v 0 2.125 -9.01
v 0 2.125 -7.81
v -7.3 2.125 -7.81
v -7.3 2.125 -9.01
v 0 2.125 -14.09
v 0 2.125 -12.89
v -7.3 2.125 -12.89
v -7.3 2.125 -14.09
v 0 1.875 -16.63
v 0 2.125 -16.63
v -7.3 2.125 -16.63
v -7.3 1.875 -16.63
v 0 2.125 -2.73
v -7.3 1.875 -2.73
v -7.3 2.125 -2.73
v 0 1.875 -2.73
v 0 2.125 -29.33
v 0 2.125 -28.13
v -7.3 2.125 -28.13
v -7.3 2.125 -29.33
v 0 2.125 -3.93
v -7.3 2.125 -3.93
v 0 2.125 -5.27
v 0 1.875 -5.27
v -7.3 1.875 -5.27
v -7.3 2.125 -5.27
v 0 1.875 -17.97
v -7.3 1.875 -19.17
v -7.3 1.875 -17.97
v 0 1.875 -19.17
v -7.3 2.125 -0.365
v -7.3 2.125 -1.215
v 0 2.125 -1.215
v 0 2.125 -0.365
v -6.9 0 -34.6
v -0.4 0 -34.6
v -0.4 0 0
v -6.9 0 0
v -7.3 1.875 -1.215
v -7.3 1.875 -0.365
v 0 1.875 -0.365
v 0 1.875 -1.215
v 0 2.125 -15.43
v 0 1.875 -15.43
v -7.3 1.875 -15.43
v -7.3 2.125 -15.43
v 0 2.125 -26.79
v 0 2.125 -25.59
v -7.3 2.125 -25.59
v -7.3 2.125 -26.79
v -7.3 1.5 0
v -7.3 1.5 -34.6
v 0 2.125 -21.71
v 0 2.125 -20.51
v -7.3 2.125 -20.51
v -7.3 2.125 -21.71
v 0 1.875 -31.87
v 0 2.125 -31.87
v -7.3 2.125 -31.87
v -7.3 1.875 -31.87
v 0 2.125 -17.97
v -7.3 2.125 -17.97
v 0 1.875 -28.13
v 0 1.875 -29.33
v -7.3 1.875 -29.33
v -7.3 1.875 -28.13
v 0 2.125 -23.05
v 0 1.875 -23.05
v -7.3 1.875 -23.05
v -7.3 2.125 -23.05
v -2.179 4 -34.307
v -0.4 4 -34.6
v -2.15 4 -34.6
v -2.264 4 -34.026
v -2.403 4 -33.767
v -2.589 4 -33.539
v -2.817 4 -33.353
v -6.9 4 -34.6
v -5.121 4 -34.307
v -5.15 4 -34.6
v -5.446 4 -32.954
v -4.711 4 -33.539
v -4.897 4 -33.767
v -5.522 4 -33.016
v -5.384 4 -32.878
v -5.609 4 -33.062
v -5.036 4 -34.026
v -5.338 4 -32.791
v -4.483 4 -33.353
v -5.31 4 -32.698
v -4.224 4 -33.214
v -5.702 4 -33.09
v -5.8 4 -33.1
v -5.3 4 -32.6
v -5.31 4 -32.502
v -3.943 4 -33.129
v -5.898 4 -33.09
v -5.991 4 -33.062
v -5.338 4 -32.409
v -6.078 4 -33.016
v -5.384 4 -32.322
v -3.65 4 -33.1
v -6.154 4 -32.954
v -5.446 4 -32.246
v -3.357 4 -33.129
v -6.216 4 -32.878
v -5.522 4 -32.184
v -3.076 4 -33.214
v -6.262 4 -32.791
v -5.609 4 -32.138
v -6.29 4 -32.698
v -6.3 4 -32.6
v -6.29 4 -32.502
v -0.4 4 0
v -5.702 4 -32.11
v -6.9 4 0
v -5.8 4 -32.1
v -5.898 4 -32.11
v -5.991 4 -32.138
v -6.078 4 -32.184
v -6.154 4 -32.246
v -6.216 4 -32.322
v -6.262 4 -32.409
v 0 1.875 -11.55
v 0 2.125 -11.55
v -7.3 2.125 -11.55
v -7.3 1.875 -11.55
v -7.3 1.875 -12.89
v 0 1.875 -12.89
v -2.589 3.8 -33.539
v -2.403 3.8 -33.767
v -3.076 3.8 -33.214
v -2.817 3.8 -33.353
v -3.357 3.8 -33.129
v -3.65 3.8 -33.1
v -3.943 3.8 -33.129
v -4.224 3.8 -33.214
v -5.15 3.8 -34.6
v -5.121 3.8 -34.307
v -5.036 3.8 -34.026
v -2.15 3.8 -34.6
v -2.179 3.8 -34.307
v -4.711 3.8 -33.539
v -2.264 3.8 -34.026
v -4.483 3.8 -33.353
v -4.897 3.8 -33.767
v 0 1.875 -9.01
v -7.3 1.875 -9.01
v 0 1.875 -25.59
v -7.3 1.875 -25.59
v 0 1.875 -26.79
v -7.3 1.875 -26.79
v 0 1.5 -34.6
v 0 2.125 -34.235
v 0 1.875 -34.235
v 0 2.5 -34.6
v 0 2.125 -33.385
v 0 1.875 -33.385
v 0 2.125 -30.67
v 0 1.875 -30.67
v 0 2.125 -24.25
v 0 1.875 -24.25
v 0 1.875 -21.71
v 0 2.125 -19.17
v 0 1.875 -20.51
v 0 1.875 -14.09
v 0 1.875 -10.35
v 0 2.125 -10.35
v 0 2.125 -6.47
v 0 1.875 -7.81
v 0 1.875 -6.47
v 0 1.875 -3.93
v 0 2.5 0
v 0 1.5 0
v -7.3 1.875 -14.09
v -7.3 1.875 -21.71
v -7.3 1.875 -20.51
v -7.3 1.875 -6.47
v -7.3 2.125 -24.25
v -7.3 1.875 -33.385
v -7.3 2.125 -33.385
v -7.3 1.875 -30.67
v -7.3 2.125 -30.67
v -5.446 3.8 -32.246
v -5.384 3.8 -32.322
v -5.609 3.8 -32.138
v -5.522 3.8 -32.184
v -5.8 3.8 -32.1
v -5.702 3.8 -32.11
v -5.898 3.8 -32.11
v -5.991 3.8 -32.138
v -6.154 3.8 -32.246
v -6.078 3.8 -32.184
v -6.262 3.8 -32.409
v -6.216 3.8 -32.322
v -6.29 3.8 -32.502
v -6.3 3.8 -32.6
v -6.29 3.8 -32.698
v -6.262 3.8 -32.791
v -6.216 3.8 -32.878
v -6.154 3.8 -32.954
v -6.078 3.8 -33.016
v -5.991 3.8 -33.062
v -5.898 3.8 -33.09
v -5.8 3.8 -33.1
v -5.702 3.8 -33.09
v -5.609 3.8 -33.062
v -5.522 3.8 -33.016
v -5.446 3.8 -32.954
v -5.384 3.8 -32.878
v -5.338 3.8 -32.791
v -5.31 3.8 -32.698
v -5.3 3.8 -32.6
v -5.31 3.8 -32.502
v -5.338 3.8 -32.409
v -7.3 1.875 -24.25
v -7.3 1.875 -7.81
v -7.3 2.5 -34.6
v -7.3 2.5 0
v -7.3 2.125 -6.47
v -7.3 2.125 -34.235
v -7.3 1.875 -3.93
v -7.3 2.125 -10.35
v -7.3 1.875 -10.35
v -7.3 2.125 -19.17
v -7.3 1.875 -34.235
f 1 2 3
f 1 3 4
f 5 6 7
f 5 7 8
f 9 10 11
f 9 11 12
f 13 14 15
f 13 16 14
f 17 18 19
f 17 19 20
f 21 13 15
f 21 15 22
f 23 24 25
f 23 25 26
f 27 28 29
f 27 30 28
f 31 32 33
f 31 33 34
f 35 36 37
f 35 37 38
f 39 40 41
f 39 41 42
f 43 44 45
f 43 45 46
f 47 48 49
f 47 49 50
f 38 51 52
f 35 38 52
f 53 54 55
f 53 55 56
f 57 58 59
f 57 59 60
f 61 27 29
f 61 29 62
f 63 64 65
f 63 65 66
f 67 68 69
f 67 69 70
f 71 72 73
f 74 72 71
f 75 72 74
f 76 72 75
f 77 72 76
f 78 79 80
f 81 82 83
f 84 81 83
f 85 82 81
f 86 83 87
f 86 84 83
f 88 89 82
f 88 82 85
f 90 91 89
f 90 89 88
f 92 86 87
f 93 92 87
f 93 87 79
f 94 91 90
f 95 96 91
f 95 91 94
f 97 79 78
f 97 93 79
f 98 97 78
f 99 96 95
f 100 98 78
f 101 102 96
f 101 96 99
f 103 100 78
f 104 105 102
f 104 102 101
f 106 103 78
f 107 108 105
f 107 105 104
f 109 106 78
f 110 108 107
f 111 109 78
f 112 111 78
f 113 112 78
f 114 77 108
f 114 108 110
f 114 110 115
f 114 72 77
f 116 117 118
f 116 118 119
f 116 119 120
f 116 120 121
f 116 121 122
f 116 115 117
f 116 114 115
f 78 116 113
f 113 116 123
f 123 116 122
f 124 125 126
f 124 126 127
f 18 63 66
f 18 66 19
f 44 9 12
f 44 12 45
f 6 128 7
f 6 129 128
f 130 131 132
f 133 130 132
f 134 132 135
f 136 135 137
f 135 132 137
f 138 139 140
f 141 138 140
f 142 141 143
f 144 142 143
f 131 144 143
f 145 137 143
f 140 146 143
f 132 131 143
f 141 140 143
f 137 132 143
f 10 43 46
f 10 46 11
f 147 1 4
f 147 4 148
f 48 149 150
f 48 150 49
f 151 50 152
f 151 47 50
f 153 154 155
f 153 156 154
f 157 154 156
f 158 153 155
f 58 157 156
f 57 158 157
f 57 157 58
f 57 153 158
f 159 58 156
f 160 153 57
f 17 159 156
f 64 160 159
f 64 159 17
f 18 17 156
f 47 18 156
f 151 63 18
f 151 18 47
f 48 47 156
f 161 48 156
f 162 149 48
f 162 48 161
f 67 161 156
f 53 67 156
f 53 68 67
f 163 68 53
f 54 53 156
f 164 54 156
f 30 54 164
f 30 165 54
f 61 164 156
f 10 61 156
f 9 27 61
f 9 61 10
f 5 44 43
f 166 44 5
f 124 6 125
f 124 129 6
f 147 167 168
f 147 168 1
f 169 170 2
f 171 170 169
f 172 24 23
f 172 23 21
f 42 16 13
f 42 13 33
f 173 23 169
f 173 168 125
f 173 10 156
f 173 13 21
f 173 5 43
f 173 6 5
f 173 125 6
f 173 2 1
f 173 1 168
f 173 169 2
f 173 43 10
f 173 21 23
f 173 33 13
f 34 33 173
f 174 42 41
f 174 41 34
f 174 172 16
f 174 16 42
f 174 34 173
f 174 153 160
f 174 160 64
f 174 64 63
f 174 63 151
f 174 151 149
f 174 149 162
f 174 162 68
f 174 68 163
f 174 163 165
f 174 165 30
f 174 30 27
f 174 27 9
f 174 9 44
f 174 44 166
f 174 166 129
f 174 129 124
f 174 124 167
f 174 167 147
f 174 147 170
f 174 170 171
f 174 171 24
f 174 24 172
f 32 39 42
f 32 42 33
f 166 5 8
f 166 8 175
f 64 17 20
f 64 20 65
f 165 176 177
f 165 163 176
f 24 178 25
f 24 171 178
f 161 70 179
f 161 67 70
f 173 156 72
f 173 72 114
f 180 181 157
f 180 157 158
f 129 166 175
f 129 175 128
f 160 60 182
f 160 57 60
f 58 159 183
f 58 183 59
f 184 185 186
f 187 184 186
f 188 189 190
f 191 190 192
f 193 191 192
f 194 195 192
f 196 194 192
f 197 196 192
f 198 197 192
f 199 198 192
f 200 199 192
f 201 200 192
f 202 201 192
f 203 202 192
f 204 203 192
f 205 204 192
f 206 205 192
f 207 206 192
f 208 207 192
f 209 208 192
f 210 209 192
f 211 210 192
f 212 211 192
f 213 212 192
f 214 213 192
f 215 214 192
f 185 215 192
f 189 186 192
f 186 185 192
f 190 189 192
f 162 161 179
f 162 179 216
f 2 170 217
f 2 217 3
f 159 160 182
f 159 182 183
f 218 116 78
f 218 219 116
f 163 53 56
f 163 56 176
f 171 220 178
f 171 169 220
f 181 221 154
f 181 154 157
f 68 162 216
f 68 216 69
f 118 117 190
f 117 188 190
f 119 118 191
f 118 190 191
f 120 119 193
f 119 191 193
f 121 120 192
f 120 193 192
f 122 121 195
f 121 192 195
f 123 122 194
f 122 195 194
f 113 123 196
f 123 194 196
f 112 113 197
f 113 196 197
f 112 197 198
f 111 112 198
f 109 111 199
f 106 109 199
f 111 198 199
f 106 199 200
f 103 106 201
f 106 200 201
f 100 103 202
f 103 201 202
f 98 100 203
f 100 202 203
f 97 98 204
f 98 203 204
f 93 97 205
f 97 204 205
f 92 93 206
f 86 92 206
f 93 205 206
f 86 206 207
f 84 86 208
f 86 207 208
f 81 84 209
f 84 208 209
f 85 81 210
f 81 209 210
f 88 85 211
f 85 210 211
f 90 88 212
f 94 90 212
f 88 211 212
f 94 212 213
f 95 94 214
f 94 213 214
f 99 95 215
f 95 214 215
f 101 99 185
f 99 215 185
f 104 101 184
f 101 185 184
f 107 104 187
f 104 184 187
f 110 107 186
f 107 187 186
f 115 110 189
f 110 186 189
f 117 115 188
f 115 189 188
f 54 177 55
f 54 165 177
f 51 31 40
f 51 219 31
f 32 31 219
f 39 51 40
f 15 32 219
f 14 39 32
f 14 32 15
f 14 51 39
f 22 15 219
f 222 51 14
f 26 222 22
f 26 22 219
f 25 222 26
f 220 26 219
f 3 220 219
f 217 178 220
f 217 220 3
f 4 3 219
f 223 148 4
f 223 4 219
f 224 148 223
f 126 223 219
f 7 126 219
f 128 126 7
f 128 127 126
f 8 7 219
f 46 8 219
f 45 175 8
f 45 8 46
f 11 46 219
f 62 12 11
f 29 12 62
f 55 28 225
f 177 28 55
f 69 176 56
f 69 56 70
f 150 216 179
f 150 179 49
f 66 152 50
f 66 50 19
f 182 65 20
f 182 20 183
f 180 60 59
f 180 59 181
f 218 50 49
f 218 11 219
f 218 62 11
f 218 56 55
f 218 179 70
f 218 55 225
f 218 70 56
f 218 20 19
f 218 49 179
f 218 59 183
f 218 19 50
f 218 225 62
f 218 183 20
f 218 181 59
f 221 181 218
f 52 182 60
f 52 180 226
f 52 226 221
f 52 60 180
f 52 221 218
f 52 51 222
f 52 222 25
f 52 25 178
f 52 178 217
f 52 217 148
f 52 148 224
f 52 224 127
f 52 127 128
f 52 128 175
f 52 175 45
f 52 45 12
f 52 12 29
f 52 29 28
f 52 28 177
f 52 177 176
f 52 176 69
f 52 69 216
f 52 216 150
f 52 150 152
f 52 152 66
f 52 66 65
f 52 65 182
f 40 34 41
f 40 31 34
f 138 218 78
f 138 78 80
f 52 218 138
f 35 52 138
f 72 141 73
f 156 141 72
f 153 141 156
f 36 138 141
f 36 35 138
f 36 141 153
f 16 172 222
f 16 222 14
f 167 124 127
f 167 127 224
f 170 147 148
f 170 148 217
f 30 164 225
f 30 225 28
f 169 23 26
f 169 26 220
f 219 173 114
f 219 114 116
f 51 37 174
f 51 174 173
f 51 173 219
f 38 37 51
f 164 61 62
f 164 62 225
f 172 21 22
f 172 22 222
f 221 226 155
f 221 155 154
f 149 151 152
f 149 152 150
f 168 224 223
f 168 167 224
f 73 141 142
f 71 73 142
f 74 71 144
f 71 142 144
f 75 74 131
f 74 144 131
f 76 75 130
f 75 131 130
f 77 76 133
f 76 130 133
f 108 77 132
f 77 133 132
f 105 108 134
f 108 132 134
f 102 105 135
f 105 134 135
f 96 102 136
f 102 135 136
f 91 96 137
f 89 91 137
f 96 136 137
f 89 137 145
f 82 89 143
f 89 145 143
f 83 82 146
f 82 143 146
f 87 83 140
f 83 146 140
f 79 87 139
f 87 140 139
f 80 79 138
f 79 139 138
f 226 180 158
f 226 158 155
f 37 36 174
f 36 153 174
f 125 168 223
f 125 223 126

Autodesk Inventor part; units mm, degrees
ref_plane "YZ Plane" through (0, 0, 0) normal (1, 0, 0) x (0, 1, 0)
ref_plane "XZ Plane" through (0, 0, 0) normal (0, 1, 0) x (-1, 0, 0)
ref_plane "XY Plane" through (0, 0, 0) normal (0, 0, 1) x (1, 0, 0)
sketch "Sketch1" plane through (0, 0, 0) normal (0, 1, 0) x (-1, 0, 0)
  line L0 (0, 0) -> (7.3, 0)
  line L1 (7.3, 0) -> (7.3, -34.6)
  line L2 (7.3, -34.6) -> (0, -34.6)
  line L3 (0, -34.6) -> (0, 0)
  dimension "d0" = 7.3
  dimension "d1" = 34.6
extrude "Extrusion1" add sketch "Sketch1" along normal blind 4
chamfer "Chamfer1" distance 0.4 distance2 1.5 1 edges at (0, 4, -17.3) measured on face at (-2.4333, 4, -11.5333)
chamfer "Chamfer2" distance 0.4 distance2 1.5 1 edges at (0, 0, -17.3) measured on face at (-2.4333, 0, -11.5333)
chamfer "Chamfer3" distance 0.4 distance2 1.5 1 edges at (-7.3, 4, -17.3) measured on face at (-2.7, 4, -11.5333)
chamfer "Chamfer4" distance 0.4 distance2 1.5 1 edges at (-7.3, 0, -17.3) measured on face at (-2.7, 0, -11.5333)
ref_plane "Work Plane1" through (-3.65, 2.5, 0) normal (1, 0, 0) x (0, 0, -1)
hole "Hole1" at (-3.65, 4, -34.6) direction (0, -1, 0) diameter 3 depth 0.2
sketch "Sketch3" plane through (0, 2.5, 0) normal (1, 0, 0) x (0, 0, -1)
  line L0 (34.6, -1) -> (34.6, 0) projected
  line L1 (34.6, -0.5) -> (0, -0.5) construction
  line L2 (0, -1) -> (0, 0) projected
  line L3 (2.73, -0.375) -> (3.93, -0.375)
  line L4 (3.93, -0.375) -> (3.93, -0.625)
  line L5 (3.93, -0.625) -> (2.73, -0.625)
  line L6 (2.73, -0.625) -> (2.73, -0.375)
  line L7 (2.73, -0.375) -> (3.93, -0.625) construction
  line L8 (3.93, -0.375) -> (2.73, -0.625) construction
  point P0 (0, -2.5)
  point P1 (17.3, -0.5)
  point P2 (3.33, -0.5)
  dimension "d30" = 13.97
  dimension "d31" = 1.2
  dimension "d32" = 0.25
extrude "Extrusion2" cut sketch "Sketch3" against normal through all
pattern_linear "Rectangular Pattern1" count 12 spacing 2.54 along (0, 0, -1) of "Extrusion2"
sketch "Sketch4" plane through (-7.3, 2.5, -34.6) normal (-1, 0, 0) x (0, 0, 1)
  line L0 (33.385, -0.375) -> (34.235, -0.375)
  line L1 (34.235, -0.375) -> (34.235, -0.625)
  line L2 (34.235, -0.625) -> (33.385, -0.625)
  line L3 (33.385, -0.625) -> (33.385, -0.375)
  line L4 (31.87, -0.375) -> (30.67, -0.375) projected
  line L5 (30.67, -0.375) -> (31.87, -0.375) projected
  point P0 (34.6, -2.5)
  point P1 (31.27, -0.375)
  point P2 (33.81, -0.375)
  dimension "d38" = 0.85
  dimension "d39" = 0.25
  dimension "d53" = 2.54
extrude "Extrusion3" cut sketch "Sketch4" against normal through all
ref_plane "Work Plane2" through (0, 1.5, -17.3) normal (0, 0, -1) x (-1, 0, 0)
mirror "Mirror2" about plane through (0, 1.5, -17.3) normal (0, 0, -1) of "Extrusion3"
sketch "Sketch5" plane through (0, 4, 0) normal (0, 1, 0) x (1, 0, 0)
  line L0 (-7.3, 0) -> (-7.3, 34.6) projected
  line L1 (-7.3, 34.6) -> (-5.8, 34.6) construction
  line L2 (-5.8, 34.6) -> (-5.8, 32.6) construction
  line L3 (-5.8, 32.6) -> (-7.3, 32.6) construction
  line L4 (-7.3, 32.6) -> (-7.3, 34.6) construction
  circle A0 centre (-5.8, 32.6) radius 0.5
  point P0 (0, 0)
  dimension "d58" = 2
  dimension "d59" = 1.5
  dimension "d60" = 1
hole "Hole2" at (-5.8, 4, -32.6) direction (0, -1, 0) diameter 1 depth 0.2
equation "\"d4\" = AtmegaChamfer_D1"
equation "\"d5\" = AtmegaChamfer_D2"
equation "\"d7\" = AtmegaChamfer_D1"
equation "\"d8\" = AtmegaChamfer_D2"
equation "\"d10\" = AtmegaChamfer_D1"
equation "\"d11\" = AtmegaChamfer_D2"
equation "\"d13\" = AtmegaChamfer_D1"
equation "\"d14\" = AtmegaChamfer_D2"
equation "\"d30\" = 0.5 * Atmega28PinsDistance - atmegaPinSpacing"
equation "\"d31\" = atmegaPinWidth1"
equation "\"d37\" = atmegaPinSpacing"
equation "\"d53\" = atmegaPinSpacing"
equation "\"AtmegaChamfer_D1\" = 0.4"
equation "\"atmegaPinDistance\" = 2.54"
equation "\"Thickness\" = 0.25"
equation "\"BendRadius\" = 0.25"
equation "\"BendReliefWidth\" = 0.25"
equation "\"BendReliefDepth\" = 0.125"
equation "\"CornerReliefSize\" = 1"
equation "\"MinimumRemnant\" = 0.5"
equation "\"TransitionRadius\" = 0.25"
equation "\"JacobiRadiusSize\" = 0.25"
equation "\"GapSize\" = 0.25"
equation "\"atmegaPinThickness\" = 0.3"
equation "\"atmegaPinWidth1\" = 1.2"
equation "\"atmegaPinWidth2\" = 0.5"
equation "\"atmegaEndPinWidth\" = 0.9"
equation "\"atmegaPinBendAngle\" = 80deg"
equation "\"atmegaPinBaseWidth\" = 8"
equation "\"atmegaSeatingPlaneDistance\" = 3.2"
equation "\"d27\" = atmegaPinBaseWidth"
equation "\"d28\" = atmegaPinWidth1"
equation "\"d29\" = 0.25"
equation "\"d40\" = BendReliefWidth"
equation "\"d41\" = BendReliefDepth"
equation "\"d42\" = MinimumRemnant"
equation "\"d43\" = TransitionRadius"
equation "\"d45\" = 90deg"
equation "\"d46\" = BendRadius"
equation "\"d47\" = CornerReliefSize"
equation "\"d48\" = GapSize"
equation "\"d49\" = JacobiRadiusSize"
equation "\"d50\" = Thickness"
equation "\"d51\" = 0"
equation "\"d52\" = atmegaSeatingPlaneDistance"
equation "\"d54\" = 0.5 * atmegaPinWidth2"
equation "\"d56\" = 2.5"
equation "\"d44\" = atmegaPinLenght"
equation "\"Atmega28PinsDistance\" = 13 * atmegaPinSpacing"
equation "\"atmegaPinSpacing\" = 2.54"
equation "\"AtmegaChamfer_D2\" = 1.5"
equation "\"atmegaPinLenght\" = 5.7"
properties part number "atmega_mold"
